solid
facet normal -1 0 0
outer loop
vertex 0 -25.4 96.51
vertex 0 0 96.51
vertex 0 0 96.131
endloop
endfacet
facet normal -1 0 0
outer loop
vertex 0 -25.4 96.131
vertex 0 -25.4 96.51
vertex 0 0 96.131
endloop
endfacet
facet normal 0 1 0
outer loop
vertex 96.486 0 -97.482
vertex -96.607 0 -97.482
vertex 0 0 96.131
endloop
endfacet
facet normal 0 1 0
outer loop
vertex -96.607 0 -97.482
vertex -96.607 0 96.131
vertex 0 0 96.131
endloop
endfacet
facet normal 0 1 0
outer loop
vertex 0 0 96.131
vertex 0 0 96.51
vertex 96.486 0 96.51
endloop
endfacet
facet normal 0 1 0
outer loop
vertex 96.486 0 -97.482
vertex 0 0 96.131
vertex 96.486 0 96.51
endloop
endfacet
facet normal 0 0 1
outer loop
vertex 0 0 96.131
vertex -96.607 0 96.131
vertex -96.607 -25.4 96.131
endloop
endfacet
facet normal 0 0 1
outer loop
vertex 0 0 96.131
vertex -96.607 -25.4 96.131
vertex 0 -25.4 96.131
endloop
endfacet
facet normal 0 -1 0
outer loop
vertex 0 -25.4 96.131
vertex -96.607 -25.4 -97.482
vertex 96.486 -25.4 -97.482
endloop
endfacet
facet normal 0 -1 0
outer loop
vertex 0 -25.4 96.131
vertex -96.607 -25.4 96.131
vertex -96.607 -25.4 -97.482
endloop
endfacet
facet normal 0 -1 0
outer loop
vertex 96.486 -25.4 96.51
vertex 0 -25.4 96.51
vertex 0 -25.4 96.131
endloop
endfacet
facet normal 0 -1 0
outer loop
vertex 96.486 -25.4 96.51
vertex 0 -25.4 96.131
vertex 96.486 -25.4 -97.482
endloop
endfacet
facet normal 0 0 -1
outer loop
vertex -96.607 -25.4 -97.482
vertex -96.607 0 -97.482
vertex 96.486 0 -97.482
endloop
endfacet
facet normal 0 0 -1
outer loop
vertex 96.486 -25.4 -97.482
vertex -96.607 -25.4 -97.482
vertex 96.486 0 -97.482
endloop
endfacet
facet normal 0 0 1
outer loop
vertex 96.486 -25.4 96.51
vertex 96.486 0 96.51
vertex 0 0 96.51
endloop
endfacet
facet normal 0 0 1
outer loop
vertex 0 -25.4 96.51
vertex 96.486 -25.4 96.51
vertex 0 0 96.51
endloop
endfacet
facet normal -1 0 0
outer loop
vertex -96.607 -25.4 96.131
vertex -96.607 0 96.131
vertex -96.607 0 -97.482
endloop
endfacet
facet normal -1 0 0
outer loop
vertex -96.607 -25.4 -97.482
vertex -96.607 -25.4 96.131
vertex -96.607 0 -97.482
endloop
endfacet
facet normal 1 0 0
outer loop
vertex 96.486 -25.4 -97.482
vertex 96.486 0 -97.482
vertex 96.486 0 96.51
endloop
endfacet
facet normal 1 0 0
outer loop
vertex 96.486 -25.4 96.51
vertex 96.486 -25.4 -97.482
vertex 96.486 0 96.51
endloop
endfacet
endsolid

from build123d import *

# Parameters (mm, degrees)
F0_W     = 96.6067910194
F0_H     = 96.1308255792
F0_W_2   = 96.4857041836
F0_H_2   = 0.4863366485
F0_H_3   = 96.9959124923
F1_DEPTH = 25.4


with BuildPart() as f1:
    # F0 (on Front) → F1 (new body)
    with BuildSketch(Plane.XZ):
        Polygon((0, -0.4863366485), (0, 0), (-96.6067910194, 0), (-96.6067910194, -97.4822491407), (0, -97.4822491407), align=None)
        with Locations((-48.3033955097, 48.0654127896)):
            Rectangle(F0_W, F0_H)
        with Locations((48.2428520918, -0.2431683242)):
            Rectangle(F0_W_2, F0_H_2)
        Polygon((0, 96.1308255792), (0, 0), (96.4857041836, 0), (96.4857041836, 96.5095758438), (0, 96.5095758438), align=None)
        with Locations((48.2428520918, -48.9842928946)):
            Rectangle(F0_W_2, F0_H_3)
    extrude(amount=F1_DEPTH)


solid = f1.part
